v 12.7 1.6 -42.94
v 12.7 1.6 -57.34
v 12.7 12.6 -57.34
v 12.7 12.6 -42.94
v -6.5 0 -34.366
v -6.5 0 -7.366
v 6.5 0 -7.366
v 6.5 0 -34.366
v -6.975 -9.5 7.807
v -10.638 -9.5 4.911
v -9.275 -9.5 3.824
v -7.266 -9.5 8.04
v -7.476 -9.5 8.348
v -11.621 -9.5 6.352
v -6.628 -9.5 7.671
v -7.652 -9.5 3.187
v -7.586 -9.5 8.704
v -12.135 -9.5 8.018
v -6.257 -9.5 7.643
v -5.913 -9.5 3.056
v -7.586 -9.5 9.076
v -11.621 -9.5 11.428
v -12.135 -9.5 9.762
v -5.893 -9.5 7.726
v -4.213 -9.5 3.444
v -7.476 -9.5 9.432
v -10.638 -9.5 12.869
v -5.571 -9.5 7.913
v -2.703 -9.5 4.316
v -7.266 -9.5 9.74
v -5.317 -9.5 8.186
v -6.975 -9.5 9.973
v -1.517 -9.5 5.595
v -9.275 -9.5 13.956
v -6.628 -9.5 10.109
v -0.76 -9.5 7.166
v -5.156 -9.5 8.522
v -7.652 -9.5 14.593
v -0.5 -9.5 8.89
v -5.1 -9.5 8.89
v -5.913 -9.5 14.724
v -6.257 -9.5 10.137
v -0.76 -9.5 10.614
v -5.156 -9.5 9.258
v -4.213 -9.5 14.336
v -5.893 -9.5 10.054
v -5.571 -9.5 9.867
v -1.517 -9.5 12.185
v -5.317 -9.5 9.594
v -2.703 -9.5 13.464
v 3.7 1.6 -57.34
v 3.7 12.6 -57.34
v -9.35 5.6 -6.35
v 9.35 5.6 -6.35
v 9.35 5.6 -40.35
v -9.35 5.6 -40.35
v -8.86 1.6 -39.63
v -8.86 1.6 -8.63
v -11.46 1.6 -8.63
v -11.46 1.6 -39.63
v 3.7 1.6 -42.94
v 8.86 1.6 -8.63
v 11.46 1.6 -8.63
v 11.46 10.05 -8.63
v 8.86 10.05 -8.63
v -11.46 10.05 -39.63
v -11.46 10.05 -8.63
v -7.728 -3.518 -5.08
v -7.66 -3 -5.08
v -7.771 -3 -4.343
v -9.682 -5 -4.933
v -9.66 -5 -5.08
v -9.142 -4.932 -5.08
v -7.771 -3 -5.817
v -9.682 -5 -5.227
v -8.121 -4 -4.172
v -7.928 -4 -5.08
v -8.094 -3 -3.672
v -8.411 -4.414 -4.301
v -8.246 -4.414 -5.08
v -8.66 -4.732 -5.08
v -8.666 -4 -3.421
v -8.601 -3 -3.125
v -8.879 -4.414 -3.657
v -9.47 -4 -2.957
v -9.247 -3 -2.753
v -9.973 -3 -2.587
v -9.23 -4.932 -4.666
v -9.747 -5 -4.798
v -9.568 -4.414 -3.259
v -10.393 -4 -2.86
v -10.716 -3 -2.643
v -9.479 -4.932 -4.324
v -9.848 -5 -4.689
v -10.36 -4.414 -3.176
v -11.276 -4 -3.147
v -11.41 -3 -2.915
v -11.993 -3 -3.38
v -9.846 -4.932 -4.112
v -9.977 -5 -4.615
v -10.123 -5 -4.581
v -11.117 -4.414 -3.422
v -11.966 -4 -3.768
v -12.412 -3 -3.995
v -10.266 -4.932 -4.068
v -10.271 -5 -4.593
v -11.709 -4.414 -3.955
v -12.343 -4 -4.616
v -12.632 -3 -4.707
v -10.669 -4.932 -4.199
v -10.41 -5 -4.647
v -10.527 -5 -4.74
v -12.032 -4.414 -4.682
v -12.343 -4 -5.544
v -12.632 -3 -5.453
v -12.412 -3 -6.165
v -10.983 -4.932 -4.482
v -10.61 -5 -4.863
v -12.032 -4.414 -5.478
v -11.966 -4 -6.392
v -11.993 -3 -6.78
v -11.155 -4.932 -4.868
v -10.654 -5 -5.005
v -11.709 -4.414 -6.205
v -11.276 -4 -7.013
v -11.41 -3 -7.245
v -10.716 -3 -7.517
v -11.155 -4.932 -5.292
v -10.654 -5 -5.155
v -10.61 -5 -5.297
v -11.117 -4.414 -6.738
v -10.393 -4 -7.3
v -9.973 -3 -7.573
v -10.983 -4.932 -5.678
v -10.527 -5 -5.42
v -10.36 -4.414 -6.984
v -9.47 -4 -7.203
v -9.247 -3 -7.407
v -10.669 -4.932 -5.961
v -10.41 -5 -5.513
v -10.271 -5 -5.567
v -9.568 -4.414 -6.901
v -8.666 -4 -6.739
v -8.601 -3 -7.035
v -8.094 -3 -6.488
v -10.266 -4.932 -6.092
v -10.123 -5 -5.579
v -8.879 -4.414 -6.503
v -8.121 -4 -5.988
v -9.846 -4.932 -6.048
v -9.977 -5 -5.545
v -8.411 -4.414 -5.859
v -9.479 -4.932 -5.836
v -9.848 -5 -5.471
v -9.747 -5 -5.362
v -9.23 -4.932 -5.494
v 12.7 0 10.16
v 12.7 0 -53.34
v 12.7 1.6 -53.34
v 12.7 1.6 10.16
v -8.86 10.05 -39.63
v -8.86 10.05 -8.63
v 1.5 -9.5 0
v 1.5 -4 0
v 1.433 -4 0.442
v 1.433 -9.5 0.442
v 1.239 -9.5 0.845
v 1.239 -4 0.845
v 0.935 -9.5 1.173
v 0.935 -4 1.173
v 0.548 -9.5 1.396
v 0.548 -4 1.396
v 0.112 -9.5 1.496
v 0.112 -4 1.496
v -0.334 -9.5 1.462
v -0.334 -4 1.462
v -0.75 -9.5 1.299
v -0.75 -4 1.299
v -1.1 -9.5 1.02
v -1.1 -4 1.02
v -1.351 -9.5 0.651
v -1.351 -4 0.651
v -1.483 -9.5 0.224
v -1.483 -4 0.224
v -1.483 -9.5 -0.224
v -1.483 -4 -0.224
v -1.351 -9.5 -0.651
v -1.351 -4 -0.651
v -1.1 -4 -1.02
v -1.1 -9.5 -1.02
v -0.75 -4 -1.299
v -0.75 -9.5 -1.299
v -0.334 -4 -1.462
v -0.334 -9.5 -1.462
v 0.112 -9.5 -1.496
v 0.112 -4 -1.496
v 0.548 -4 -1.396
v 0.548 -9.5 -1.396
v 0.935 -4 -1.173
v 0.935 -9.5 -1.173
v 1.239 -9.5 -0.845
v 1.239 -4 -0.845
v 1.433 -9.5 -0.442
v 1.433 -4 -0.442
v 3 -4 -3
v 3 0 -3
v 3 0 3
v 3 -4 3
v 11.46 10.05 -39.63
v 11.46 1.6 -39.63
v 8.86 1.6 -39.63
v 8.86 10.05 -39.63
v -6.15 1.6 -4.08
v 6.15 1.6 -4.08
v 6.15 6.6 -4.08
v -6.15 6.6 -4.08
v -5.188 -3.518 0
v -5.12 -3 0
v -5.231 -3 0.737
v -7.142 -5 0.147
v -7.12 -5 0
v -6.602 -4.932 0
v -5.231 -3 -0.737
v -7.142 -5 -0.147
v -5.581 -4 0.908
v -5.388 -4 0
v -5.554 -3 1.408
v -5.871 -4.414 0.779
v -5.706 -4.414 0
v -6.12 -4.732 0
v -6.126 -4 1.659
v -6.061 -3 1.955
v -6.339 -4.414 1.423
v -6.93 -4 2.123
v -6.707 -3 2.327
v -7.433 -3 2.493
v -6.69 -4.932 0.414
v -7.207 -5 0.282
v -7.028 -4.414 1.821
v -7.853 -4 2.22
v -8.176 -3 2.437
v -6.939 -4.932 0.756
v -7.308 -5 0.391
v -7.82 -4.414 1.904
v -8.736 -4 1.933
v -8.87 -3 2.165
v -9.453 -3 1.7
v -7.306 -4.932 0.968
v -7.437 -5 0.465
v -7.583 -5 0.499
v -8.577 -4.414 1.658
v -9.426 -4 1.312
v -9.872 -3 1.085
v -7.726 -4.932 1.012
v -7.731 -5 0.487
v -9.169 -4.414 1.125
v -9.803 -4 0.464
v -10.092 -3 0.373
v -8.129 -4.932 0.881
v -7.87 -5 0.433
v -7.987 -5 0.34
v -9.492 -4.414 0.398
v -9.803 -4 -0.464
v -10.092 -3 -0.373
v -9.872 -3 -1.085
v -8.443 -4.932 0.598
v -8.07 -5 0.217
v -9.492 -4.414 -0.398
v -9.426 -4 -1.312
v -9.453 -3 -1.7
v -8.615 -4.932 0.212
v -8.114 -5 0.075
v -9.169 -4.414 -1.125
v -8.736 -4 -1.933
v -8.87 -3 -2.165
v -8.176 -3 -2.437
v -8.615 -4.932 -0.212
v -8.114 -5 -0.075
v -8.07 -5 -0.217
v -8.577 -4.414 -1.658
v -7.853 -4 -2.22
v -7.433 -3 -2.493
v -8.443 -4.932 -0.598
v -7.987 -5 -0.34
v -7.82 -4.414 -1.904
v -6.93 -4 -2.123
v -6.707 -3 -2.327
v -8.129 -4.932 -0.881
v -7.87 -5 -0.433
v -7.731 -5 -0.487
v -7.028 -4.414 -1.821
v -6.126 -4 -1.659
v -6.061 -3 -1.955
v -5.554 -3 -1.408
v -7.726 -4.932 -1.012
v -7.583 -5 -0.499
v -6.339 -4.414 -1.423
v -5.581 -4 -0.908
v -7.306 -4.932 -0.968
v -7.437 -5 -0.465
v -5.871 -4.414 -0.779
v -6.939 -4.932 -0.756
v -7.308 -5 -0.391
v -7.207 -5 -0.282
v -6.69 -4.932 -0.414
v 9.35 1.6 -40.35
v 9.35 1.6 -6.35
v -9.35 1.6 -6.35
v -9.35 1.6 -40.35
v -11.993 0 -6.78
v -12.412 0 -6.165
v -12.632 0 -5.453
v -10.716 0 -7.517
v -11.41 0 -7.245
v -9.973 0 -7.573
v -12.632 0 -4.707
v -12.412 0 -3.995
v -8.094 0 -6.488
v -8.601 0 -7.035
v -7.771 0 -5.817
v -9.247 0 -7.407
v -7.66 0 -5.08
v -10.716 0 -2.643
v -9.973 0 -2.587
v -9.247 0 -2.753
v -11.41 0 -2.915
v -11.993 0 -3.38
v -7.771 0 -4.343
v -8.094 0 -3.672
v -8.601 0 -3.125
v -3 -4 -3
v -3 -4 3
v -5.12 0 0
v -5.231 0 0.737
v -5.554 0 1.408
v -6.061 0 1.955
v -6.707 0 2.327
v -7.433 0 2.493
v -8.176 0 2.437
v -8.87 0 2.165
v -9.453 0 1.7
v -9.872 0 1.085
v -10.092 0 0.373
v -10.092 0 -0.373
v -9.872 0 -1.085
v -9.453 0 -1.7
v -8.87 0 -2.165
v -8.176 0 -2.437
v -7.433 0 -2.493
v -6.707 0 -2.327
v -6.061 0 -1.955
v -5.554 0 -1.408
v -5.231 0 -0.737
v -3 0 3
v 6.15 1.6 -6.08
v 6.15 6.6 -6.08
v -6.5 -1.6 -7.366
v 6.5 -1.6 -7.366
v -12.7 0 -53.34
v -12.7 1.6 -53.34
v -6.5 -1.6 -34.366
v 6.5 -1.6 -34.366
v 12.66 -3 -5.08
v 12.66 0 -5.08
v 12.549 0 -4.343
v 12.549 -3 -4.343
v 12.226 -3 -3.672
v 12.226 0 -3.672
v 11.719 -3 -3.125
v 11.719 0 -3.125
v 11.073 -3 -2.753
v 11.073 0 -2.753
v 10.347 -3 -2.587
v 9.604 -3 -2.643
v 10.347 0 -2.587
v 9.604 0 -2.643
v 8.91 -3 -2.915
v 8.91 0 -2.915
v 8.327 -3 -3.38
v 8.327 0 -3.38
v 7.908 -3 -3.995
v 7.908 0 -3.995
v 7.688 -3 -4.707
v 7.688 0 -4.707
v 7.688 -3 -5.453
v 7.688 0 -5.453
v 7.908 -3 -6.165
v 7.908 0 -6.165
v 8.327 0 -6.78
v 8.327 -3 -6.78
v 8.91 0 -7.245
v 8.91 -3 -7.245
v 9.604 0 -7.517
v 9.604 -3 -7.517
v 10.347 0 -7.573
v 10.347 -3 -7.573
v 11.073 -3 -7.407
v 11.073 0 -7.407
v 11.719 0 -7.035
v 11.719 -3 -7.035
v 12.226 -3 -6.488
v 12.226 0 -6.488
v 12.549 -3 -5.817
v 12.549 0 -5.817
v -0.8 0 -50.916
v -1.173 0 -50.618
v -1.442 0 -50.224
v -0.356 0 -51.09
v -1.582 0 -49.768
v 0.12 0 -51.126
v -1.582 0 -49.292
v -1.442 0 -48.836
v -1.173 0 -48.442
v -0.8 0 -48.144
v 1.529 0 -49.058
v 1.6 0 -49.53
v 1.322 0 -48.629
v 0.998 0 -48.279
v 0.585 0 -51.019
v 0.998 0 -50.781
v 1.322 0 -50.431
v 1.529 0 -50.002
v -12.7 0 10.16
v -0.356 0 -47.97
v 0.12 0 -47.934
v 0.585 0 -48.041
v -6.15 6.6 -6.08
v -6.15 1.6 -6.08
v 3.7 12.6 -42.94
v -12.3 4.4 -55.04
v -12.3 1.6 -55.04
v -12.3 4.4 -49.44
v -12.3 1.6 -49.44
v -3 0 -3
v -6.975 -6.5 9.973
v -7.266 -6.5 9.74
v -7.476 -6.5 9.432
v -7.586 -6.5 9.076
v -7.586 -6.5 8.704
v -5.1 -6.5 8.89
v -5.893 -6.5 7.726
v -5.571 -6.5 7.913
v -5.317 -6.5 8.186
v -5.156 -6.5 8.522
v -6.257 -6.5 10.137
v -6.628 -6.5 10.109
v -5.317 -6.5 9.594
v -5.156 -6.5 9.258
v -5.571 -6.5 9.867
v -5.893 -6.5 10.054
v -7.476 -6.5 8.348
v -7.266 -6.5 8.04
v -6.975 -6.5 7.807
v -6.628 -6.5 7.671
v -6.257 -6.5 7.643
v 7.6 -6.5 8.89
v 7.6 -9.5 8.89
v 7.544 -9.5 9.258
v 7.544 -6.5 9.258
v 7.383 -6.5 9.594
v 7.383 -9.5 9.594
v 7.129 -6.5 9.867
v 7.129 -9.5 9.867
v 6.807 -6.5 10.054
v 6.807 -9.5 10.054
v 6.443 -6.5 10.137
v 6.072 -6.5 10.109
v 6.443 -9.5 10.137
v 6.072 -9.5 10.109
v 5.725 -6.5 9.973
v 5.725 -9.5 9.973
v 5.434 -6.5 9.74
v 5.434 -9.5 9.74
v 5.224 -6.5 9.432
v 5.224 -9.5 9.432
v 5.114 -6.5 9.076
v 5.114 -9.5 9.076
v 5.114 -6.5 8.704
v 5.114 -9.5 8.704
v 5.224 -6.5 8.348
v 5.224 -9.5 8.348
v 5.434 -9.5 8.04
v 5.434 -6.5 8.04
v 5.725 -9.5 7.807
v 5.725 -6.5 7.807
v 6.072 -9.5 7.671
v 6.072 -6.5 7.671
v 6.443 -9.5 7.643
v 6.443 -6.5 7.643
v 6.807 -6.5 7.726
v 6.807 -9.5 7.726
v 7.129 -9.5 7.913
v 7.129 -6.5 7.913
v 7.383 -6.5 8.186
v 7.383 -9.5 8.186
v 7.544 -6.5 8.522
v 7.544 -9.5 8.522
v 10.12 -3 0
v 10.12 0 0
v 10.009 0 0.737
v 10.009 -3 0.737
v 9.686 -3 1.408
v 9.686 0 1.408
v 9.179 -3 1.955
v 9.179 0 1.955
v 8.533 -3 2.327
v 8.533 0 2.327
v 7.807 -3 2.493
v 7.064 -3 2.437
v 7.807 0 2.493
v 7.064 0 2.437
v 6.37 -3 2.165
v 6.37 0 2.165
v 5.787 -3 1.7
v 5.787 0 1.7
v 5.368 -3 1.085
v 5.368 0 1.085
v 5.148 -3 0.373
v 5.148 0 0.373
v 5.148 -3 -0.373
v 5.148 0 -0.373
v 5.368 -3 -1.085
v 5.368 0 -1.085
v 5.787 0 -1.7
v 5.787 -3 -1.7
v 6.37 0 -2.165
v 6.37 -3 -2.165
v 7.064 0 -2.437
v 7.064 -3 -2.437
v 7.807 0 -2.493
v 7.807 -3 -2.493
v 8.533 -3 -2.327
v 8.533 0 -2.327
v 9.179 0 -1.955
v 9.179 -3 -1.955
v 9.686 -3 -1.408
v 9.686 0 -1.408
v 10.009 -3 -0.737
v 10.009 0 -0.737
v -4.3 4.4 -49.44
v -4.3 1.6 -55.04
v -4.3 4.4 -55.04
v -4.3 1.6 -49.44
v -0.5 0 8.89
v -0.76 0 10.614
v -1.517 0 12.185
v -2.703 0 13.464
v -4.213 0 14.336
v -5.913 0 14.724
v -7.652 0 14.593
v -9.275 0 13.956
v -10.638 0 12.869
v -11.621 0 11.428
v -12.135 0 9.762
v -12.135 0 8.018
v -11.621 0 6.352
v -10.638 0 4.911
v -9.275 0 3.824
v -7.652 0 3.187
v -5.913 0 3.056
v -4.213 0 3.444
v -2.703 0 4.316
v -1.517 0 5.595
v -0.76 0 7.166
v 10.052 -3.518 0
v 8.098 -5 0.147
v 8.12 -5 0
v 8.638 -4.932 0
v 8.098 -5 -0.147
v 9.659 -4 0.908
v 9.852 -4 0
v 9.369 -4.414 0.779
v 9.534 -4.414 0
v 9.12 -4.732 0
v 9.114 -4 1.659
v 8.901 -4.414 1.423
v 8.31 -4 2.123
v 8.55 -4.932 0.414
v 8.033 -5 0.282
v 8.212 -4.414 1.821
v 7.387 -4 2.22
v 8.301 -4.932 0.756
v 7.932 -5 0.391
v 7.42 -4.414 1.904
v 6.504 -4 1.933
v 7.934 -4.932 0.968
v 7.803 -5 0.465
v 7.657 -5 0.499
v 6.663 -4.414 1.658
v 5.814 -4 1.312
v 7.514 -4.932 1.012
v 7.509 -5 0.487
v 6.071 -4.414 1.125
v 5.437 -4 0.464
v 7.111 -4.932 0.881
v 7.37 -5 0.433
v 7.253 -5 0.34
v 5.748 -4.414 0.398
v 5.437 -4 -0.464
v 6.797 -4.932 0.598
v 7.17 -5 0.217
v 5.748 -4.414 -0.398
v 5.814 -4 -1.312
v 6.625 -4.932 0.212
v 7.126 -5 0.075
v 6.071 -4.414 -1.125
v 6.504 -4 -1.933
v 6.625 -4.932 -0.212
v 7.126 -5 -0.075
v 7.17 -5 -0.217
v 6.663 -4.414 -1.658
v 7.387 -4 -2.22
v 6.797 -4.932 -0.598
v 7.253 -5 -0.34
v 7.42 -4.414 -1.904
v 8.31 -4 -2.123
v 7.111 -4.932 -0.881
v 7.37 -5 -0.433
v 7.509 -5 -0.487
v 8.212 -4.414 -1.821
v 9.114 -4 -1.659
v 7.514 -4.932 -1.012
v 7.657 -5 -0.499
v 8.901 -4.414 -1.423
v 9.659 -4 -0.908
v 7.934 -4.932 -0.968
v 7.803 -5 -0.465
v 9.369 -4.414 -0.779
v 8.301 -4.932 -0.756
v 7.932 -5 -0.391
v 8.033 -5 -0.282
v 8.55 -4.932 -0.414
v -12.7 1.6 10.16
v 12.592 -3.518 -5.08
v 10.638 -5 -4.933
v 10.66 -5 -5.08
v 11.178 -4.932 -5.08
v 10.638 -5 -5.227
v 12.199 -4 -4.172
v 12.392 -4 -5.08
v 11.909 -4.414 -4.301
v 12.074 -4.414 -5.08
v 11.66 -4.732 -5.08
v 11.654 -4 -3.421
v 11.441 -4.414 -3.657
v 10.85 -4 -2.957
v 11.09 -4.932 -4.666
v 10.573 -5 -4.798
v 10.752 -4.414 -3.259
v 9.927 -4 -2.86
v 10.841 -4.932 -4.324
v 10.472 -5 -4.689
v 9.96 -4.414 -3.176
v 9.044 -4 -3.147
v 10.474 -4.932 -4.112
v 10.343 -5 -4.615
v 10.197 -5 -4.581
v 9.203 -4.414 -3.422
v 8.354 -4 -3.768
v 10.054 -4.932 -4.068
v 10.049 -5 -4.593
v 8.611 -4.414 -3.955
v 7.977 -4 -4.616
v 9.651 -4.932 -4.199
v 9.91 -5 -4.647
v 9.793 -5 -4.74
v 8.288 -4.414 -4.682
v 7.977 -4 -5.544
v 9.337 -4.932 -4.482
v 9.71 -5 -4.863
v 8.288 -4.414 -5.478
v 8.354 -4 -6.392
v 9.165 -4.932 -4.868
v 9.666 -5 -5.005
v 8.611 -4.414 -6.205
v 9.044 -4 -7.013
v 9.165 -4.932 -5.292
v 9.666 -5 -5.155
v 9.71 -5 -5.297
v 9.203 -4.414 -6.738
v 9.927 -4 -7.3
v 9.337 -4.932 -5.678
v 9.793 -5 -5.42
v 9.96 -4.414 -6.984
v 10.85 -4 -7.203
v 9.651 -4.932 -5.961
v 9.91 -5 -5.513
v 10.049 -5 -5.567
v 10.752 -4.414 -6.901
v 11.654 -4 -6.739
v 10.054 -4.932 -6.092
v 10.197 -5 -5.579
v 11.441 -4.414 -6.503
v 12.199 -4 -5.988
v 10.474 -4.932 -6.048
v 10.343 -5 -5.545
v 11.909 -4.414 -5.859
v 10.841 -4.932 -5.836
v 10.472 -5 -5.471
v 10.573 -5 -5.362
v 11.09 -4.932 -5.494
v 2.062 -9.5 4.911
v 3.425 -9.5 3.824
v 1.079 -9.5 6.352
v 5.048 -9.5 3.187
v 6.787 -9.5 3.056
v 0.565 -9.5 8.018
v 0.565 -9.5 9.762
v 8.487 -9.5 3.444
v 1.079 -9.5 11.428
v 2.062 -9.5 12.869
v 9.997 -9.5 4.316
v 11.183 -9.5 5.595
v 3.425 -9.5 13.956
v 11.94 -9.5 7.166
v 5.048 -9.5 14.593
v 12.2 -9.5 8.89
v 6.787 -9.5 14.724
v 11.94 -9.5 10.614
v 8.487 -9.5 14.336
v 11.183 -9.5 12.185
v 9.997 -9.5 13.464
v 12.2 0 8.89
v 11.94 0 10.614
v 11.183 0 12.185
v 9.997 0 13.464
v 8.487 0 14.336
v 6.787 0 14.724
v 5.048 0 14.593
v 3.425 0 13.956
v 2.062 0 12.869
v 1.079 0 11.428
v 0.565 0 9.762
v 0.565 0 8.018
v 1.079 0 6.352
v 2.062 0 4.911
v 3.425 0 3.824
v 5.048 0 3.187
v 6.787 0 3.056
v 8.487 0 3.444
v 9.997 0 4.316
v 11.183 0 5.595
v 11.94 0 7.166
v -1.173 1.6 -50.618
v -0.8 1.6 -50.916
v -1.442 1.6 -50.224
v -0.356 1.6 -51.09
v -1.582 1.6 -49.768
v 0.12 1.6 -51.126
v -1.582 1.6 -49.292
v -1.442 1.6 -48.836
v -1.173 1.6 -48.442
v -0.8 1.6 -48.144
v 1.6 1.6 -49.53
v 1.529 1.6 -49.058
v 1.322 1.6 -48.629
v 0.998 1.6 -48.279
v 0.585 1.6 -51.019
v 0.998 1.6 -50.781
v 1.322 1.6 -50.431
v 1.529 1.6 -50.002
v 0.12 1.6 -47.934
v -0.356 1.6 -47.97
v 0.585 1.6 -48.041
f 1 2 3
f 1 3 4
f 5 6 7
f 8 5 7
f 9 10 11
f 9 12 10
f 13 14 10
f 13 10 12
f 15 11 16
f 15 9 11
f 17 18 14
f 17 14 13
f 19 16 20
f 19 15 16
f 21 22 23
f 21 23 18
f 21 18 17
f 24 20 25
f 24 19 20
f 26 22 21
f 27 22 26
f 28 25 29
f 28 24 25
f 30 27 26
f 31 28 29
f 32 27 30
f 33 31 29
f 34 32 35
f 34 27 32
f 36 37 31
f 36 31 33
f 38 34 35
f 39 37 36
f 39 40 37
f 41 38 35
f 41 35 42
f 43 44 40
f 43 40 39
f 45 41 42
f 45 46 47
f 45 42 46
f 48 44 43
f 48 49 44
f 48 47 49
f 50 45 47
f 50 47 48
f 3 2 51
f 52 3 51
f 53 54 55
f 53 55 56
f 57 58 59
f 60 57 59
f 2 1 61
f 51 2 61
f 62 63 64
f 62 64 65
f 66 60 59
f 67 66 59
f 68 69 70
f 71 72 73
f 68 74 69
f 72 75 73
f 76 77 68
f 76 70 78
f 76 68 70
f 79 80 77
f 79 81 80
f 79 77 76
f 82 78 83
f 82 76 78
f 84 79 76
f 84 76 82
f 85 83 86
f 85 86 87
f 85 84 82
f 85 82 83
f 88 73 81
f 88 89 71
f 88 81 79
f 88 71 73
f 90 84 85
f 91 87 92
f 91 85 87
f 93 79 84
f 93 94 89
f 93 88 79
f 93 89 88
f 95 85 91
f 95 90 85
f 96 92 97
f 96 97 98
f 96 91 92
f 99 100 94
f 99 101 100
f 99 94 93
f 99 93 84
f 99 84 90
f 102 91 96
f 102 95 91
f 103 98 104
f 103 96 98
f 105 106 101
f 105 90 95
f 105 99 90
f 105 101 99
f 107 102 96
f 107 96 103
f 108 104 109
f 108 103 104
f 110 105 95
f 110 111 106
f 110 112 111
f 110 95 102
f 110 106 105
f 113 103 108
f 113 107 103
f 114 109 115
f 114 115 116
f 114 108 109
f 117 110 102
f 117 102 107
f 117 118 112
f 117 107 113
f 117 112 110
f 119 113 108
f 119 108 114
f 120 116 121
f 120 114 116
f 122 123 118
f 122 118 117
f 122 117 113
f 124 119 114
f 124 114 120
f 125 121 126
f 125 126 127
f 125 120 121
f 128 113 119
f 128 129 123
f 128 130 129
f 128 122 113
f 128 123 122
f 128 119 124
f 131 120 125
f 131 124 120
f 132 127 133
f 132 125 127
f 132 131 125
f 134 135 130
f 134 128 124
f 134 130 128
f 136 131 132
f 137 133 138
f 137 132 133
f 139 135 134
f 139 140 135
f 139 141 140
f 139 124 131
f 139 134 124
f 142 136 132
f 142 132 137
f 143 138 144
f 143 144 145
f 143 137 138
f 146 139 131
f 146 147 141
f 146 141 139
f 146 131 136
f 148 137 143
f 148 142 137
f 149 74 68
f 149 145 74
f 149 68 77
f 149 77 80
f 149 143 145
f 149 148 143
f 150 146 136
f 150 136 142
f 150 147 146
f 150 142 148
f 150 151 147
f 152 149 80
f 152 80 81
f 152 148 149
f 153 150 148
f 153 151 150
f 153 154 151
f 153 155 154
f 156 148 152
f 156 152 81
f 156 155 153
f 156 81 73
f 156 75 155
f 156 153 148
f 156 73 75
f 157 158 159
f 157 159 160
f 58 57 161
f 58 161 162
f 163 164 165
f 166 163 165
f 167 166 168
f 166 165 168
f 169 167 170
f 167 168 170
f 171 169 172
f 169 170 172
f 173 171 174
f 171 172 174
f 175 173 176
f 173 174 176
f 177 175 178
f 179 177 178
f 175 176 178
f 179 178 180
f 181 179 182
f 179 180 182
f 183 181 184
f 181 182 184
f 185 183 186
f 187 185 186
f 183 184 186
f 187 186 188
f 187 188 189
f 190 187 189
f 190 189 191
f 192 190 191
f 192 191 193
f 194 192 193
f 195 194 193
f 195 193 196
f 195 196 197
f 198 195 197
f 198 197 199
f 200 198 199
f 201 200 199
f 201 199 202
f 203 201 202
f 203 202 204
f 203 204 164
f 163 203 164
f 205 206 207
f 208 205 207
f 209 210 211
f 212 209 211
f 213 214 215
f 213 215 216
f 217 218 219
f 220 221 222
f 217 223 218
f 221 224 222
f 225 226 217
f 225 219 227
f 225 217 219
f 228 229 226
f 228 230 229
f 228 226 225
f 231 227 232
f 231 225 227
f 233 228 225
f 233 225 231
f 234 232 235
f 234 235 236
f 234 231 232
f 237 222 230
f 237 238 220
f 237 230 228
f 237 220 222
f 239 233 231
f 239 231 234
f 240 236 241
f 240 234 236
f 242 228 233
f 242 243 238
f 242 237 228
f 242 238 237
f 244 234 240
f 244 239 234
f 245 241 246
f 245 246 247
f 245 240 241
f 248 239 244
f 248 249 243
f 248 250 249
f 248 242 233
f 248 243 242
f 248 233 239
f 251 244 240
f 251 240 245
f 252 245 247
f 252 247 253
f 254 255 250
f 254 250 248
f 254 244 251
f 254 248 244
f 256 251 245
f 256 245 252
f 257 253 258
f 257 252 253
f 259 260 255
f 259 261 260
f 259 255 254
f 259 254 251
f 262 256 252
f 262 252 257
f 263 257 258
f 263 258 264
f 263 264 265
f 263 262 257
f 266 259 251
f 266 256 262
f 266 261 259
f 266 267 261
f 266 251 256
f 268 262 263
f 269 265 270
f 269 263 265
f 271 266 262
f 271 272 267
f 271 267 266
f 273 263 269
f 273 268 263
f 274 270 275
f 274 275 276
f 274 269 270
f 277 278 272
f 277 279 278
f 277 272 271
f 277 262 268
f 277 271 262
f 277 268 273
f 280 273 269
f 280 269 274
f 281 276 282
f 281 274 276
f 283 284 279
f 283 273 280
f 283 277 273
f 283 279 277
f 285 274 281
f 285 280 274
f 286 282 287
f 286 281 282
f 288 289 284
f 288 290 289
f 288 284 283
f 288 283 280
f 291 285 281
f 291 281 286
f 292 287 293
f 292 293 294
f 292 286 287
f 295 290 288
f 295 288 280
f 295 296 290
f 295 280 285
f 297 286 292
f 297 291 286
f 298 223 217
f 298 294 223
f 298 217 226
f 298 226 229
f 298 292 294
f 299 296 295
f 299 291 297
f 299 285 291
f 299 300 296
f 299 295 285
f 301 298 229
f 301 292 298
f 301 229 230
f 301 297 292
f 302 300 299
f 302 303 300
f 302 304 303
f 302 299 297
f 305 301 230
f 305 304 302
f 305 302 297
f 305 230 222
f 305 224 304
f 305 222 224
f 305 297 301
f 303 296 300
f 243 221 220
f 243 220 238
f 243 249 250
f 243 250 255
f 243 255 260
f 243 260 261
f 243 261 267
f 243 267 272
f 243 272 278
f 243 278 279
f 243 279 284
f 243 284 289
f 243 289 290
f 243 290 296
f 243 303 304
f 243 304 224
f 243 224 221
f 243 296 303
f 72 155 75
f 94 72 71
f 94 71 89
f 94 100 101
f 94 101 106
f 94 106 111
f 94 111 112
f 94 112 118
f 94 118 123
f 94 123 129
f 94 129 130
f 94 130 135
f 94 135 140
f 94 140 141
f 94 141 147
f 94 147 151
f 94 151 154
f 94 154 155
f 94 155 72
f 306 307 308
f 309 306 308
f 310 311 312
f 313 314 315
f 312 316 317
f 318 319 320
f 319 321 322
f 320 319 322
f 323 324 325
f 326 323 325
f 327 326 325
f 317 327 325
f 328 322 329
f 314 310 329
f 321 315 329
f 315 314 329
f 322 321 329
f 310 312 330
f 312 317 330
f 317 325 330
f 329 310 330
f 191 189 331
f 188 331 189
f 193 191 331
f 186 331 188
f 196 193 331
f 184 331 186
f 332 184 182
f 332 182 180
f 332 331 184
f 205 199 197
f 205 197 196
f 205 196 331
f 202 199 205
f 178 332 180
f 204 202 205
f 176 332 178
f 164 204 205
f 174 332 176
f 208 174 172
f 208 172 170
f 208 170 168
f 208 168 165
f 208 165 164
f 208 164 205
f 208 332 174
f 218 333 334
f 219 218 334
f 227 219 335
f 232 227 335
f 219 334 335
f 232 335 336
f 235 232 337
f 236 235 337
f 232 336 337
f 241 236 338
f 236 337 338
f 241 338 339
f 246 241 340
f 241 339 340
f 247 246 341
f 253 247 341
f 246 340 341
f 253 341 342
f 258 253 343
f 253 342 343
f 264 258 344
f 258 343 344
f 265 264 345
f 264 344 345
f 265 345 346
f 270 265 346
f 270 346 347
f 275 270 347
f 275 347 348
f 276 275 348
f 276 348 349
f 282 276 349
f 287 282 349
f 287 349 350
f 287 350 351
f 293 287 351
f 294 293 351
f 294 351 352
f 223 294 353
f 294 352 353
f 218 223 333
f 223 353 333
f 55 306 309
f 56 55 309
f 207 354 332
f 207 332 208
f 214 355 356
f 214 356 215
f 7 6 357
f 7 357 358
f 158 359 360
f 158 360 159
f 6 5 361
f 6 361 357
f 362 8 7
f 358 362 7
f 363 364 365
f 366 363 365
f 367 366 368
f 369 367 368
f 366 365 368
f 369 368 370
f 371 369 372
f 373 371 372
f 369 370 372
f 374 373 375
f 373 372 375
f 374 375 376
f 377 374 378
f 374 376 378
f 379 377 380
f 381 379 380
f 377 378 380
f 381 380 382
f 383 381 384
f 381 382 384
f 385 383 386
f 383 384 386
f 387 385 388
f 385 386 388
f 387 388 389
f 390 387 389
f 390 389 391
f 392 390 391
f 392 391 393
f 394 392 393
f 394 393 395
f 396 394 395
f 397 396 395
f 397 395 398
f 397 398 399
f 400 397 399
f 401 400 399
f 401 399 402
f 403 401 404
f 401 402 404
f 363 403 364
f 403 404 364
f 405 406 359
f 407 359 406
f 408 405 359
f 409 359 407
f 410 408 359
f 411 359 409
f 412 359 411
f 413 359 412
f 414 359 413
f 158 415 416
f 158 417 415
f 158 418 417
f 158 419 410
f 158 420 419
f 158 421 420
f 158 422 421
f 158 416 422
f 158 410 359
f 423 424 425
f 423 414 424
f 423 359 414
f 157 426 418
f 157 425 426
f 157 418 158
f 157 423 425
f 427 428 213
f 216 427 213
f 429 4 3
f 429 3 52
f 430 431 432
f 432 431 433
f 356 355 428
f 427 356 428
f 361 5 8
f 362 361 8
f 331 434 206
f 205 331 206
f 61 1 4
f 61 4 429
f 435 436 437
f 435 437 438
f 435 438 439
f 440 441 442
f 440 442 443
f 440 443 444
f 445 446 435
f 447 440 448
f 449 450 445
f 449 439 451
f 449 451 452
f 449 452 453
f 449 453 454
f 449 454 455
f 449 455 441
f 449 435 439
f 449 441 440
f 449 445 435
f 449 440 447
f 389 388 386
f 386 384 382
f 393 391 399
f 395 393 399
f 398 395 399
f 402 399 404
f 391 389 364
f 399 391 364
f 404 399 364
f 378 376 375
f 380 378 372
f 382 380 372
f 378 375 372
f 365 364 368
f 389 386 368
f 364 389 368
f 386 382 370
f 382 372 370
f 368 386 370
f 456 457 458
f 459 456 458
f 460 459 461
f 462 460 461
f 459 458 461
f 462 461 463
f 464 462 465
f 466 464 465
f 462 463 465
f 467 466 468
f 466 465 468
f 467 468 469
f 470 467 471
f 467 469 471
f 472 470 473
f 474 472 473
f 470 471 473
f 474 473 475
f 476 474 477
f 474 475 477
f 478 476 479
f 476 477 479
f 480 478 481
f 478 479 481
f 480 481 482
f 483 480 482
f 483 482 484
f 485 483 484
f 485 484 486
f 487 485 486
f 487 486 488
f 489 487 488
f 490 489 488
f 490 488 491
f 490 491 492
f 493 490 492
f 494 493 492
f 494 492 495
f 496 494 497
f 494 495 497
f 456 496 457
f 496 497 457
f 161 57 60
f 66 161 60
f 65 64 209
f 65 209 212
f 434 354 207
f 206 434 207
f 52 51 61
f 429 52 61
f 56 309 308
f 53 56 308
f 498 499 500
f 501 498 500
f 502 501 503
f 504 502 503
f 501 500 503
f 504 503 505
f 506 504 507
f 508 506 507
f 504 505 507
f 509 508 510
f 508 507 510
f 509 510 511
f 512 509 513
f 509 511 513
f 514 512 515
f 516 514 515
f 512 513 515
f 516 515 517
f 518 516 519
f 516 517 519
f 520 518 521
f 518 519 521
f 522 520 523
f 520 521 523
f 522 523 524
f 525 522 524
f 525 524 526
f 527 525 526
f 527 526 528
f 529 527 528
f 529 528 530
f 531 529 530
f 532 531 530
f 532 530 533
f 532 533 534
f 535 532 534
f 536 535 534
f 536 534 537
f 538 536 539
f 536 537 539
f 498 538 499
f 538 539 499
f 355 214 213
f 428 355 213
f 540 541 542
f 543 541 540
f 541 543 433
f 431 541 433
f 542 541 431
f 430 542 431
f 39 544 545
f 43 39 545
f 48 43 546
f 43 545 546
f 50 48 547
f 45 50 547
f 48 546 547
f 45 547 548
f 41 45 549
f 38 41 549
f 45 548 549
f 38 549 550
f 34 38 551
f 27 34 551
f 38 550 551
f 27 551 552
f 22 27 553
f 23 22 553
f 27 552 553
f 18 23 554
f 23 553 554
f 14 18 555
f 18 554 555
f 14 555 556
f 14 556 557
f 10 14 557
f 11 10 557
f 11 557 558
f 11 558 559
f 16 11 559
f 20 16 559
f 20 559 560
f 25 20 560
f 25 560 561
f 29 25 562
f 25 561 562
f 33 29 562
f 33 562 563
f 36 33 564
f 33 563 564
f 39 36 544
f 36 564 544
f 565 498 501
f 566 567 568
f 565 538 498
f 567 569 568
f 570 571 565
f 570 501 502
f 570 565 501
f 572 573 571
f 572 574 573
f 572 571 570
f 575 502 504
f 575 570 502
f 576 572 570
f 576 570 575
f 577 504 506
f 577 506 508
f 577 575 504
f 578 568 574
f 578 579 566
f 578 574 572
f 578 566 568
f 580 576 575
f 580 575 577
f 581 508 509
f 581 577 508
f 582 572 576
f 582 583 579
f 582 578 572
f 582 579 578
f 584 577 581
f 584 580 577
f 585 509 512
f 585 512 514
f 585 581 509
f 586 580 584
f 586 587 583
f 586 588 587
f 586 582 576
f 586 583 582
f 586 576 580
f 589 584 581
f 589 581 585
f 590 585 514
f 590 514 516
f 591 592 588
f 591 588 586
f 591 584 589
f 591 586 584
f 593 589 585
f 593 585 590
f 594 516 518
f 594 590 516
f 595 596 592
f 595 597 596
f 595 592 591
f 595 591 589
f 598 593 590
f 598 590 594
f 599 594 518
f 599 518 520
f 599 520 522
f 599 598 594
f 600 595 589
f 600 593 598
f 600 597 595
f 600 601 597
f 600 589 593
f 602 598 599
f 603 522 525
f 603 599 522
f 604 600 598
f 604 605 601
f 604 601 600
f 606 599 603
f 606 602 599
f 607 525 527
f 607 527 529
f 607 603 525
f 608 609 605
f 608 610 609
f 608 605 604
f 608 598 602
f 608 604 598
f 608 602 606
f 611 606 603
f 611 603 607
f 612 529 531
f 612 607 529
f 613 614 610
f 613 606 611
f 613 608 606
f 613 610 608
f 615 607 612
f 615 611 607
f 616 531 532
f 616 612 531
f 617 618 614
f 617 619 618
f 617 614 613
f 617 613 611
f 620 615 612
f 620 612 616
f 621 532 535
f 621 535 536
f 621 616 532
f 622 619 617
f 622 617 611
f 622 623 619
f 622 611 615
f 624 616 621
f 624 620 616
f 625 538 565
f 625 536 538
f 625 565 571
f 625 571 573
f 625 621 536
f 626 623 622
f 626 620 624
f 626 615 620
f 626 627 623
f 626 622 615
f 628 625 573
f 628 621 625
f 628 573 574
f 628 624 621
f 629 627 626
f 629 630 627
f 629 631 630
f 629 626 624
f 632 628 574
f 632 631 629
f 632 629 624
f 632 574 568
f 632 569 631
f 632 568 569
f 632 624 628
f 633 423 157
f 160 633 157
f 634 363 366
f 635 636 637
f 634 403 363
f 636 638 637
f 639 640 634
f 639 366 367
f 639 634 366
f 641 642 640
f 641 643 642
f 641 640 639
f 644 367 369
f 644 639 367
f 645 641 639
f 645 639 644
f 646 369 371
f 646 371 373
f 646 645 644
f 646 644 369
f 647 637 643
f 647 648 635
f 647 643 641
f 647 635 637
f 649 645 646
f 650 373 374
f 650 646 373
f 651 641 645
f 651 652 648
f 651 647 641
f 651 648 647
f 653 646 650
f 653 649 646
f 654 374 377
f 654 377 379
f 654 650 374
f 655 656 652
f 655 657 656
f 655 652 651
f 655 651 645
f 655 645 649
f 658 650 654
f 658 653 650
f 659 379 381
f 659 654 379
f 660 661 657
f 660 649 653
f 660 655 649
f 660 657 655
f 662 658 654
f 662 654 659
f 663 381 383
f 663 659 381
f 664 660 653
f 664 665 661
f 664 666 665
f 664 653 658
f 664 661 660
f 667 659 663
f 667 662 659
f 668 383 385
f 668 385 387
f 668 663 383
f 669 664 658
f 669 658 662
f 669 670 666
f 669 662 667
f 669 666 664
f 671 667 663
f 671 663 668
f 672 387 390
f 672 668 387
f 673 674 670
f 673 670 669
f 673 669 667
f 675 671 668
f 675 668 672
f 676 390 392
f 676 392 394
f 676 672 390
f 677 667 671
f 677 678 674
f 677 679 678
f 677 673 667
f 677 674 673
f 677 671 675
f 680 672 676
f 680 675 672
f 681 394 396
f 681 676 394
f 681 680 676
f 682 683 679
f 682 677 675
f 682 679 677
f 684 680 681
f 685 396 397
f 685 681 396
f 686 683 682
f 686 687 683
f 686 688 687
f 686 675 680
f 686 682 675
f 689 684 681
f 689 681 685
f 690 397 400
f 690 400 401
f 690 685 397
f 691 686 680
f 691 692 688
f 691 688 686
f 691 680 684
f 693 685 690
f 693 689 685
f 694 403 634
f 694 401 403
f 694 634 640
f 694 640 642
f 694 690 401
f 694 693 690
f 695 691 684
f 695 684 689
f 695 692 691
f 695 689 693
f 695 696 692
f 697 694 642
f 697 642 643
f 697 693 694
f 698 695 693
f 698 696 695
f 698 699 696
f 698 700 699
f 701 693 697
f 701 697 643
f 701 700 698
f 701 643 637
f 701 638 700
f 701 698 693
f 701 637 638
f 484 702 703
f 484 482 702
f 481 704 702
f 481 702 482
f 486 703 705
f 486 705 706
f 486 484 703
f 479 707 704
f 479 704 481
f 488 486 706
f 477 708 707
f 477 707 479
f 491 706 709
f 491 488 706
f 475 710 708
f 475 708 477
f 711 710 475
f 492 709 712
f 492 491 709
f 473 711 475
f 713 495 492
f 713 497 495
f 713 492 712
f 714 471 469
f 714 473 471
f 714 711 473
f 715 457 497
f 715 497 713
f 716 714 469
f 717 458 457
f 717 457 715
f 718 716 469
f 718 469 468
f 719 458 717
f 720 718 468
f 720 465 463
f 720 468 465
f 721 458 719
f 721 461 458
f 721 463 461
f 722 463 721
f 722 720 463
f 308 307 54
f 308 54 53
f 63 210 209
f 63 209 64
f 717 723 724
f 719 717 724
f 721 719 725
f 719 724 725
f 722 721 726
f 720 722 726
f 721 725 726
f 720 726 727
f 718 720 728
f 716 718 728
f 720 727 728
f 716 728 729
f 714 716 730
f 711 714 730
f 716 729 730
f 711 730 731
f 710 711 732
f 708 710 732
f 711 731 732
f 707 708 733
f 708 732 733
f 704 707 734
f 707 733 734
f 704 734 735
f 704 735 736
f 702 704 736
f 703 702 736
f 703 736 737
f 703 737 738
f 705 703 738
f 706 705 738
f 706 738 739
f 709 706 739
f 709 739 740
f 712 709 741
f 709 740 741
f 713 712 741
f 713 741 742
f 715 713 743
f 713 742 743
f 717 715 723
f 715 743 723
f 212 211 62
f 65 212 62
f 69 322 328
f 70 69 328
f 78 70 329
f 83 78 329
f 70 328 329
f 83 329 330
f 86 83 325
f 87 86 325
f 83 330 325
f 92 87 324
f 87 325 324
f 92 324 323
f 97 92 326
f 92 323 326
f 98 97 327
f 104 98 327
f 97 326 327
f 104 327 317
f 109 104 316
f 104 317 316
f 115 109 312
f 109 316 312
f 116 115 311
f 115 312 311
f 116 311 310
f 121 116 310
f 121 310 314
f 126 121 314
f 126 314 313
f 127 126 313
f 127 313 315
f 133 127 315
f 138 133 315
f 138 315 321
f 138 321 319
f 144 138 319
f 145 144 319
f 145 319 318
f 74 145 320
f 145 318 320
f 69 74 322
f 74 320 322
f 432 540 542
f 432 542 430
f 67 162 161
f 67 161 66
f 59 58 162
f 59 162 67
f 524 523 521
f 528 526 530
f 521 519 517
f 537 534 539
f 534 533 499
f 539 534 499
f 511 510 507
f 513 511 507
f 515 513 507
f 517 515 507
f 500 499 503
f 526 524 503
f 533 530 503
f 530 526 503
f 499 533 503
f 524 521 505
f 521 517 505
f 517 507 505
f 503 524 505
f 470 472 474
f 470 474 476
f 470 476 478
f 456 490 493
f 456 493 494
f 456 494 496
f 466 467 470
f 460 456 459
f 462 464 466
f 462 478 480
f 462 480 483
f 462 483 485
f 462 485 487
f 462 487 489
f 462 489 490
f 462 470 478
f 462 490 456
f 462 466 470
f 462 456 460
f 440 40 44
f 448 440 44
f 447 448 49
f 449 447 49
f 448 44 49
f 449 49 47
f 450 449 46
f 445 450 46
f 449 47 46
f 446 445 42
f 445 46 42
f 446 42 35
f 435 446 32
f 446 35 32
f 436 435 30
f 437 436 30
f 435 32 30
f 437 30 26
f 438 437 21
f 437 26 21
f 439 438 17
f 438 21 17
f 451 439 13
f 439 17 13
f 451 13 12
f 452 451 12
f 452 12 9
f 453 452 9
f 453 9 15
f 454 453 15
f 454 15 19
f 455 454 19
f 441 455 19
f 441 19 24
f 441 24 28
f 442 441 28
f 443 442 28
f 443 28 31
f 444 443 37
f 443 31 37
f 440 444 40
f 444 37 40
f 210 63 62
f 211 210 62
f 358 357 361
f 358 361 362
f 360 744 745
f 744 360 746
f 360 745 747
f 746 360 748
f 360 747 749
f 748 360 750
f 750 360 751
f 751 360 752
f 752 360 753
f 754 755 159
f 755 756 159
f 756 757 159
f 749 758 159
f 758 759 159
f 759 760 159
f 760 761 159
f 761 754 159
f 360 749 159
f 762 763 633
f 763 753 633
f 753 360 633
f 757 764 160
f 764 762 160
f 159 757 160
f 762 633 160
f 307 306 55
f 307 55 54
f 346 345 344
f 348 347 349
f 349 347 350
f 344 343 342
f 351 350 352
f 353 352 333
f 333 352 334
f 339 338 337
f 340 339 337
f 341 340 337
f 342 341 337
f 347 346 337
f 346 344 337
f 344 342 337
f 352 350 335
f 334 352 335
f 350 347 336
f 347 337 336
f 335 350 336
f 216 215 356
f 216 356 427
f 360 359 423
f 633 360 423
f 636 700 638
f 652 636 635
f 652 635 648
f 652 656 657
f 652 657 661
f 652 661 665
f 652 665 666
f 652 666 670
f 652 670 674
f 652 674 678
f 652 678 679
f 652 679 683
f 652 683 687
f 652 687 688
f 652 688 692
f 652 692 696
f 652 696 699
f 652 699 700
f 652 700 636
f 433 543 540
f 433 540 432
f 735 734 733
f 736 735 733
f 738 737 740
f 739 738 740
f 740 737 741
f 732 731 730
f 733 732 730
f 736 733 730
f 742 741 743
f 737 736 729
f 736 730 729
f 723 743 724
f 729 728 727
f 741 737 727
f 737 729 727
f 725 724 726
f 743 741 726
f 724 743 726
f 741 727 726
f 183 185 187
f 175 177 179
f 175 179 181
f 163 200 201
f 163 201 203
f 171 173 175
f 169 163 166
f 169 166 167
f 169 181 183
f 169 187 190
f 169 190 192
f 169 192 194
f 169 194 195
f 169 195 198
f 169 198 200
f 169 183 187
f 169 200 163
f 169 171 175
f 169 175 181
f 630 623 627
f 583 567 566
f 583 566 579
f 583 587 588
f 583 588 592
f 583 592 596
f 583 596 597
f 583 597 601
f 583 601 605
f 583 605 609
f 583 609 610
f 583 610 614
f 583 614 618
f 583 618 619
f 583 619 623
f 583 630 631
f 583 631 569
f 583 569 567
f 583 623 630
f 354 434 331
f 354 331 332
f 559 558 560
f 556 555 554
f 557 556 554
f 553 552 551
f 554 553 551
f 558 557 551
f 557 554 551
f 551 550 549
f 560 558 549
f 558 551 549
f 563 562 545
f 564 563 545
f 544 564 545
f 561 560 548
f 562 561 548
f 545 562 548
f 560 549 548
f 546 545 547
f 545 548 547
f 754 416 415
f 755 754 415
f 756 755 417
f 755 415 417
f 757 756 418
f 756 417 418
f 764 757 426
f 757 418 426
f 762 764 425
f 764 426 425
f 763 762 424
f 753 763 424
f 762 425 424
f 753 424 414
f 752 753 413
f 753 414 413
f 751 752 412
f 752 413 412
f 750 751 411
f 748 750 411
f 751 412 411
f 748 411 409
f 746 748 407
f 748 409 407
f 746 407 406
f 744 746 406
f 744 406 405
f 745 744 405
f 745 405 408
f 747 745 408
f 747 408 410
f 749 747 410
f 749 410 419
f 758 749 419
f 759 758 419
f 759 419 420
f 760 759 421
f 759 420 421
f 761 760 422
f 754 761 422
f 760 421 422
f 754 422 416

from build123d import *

# Parameters (mm, degrees)
F0_W      = 25.4
F0_H      = 63.5
F0_R      = 1.6
F1_DEPTH  = 1.6
F2_W      = 6
F2_H      = 6
F3_DEPTH  = 4
F4_R      = 1.5
F5_DEPTH  = 9.5
F6_R      = 5.85
F7_DEPTH  = 9.5
F8_W      = 13
F8_H      = 27
F9_DEPTH  = 1.6
F10_W     = 18.7
F10_H     = 34
F11_DEPTH = 4
F12_W     = 2.6
F12_H     = 31
F13_DEPTH = 8.45
F14_W     = 9
F14_H     = 14.4
F15_DEPTH = 11
F16_W     = 8
F16_H     = 5.6
F17_DEPTH = 2.8
F18_W     = 12.3
F18_H     = 2
F19_DEPTH = 5
F20_R     = 2.5
F21_DEPTH = 5
F22_R     = 2
F22_2_R   = 2
F22_3_R   = 2
F22_4_R   = 2
F23_R     = 1.25
F24_DEPTH = 3


with BuildPart() as f1:
    # F0 (on Front) → F1 (new body)
    with BuildSketch(Plane.XZ):
        with Locations((0, -21.59)):
            Rectangle(F0_W, F0_H)
        with Locations((0, -49.53)):
            Circle(F0_R, mode=Mode.SUBTRACT)
    extrude(amount=-F1_DEPTH)


with BuildPart() as f3:
    # F2 (on Front) → F3 (new body)
    with BuildSketch(Plane.XZ):
        Rectangle(F2_W, F2_H)
    extrude(amount=F3_DEPTH)

    # F4 (on Front) → F5 (join)
    with BuildSketch(Plane.XZ):
        Circle(F4_R)
    extrude(amount=F5_DEPTH)


with BuildPart() as f7:
    # F6 (on Front) → F7 (new body)
    with BuildSketch(Plane.XZ):
        with Locations((-6.35, 8.89)):
            Circle(F6_R)
    extrude(amount=F7_DEPTH)


with BuildPart() as f7b:
    # F6 (on Front) → F7, piece 2 (new body)
    with BuildSketch(Plane.XZ):
        with Locations((6.35, 8.89)):
            Circle(F6_R)
    extrude(amount=F7_DEPTH)


with BuildPart() as f9:
    # F8 (on Front) → F9 (new body)
    with BuildSketch(Plane.XZ):
        with Locations((0, -20.866)):
            Rectangle(F8_W, F8_H)
    extrude(amount=F9_DEPTH)


with BuildPart() as f11:
    # F10 (on face) → F11 (new body)
    with BuildSketch(Plane(origin=(0, 1.6, 0), x_dir=(-1, 0, 0), z_dir=(0, 1, 0))):
        with Locations((0, -23.35)):
            Rectangle(F10_W, F10_H)
    extrude(amount=F11_DEPTH)


with BuildPart() as f13:
    # F12 (on face) → F13 (new body)
    with BuildSketch(Plane(origin=(0, 1.6, 0), x_dir=(-1, 0, 0), z_dir=(0, 1, 0))):
        with Locations((-10.16, -24.13)):
            Rectangle(F12_W, F12_H)
    extrude(amount=F13_DEPTH)


with BuildPart() as f13b:
    # F12 (on face) → F13, piece 2 (new body)
    with BuildSketch(Plane(origin=(0, 1.6, 0), x_dir=(-1, 0, 0), z_dir=(0, 1, 0))):
        with Locations((10.16, -24.13)):
            Rectangle(F12_W, F12_H)
    extrude(amount=F13_DEPTH)


with BuildPart() as f15:
    # F14 (on face) → F15 (new body)
    with BuildSketch(Plane(origin=(0, 1.6, 0), x_dir=(-1, 0, 0), z_dir=(0, 1, 0))):
        with Locations((-8.2, -50.14)):
            Rectangle(F14_W, F14_H)
    extrude(amount=F15_DEPTH)


with BuildPart() as f17:
    # F16 (on face) → F17 (new body)
    with BuildSketch(Plane(origin=(0, 1.6, 0), x_dir=(-1, 0, 0), z_dir=(0, 1, 0))):
        with Locations((8.3, -52.24)):
            Rectangle(F16_W, F16_H)
    extrude(amount=F17_DEPTH)


with BuildPart() as f19:
    # F18 (on face) → F19 (new body)
    with BuildSketch(Plane(origin=(0, 1.6, 0), x_dir=(-1, 0, 0), z_dir=(0, 1, 0))):
        with Locations((0, -5.08)):
            Rectangle(F18_W, F18_H)
    extrude(amount=F19_DEPTH)


with BuildPart() as f21:
    # F20 (on Front) → F21 (new body)
    with BuildSketch(Plane.XZ):
        with Locations((-7.62, 0)):
            Circle(F20_R)
    extrude(amount=F21_DEPTH)

    # F22#2
    f22_2_edges = [f21.edges().sort_by_distance(p)[0] for p in [
        (-10.12, -5, 0),
    ]]
    fillet(f22_2_edges, radius=F22_2_R)


with BuildPart() as f21b:
    # F20 (on Front) → F21, piece 2 (new body)
    with BuildSketch(Plane.XZ):
        with Locations((7.62, 0)):
            Circle(F20_R)
    extrude(amount=F21_DEPTH)

    # F22#3
    f22_3_edges = [f21b.edges().sort_by_distance(p)[0] for p in [
        (5.12, -5, 0),
    ]]
    fillet(f22_3_edges, radius=F22_3_R)


with BuildPart() as f21c:
    # F20 (on Front) → F21, piece 3 (new body)
    with BuildSketch(Plane.XZ):
        with Locations((10.16, -5.08)):
            Circle(F20_R)
    extrude(amount=F21_DEPTH)

    # F22#4
    f22_4_edges = [f21c.edges().sort_by_distance(p)[0] for p in [
        (7.66, -5, -5.08),
    ]]
    fillet(f22_4_edges, radius=F22_4_R)


with BuildPart() as f21d:
    # F20 (on Front) → F21, piece 4 (new body)
    with BuildSketch(Plane.XZ):
        with Locations((-10.16, -5.08)):
            Circle(F20_R)
    extrude(amount=F21_DEPTH)

    # F22
    f22_edges = [f21d.edges().sort_by_distance(p)[0] for p in [
        (-12.66, -5, -5.08),
    ]]
    fillet(f22_edges, radius=F22_R)


with BuildPart() as f24_tool:
    # F23 (on face) → F24 (new body)
    with BuildSketch(Plane.XZ.offset(9.5)):
        with Locations((-6.35, 8.89)):
            Circle(F23_R)
        with Locations((6.35, 8.89)):
            Circle(F23_R)
    extrude(amount=-F24_DEPTH)


with BuildPart() as f7_1:
    add(f7.part)

    # F24: cut by f24_tool
    add(f24_tool.part, mode=Mode.SUBTRACT)


with BuildPart() as f7b_1:
    add(f7b.part)

    # F24: cut by f24_tool
    add(f24_tool.part, mode=Mode.SUBTRACT)


solid = Compound([f1.part, f3.part, f9.part, f11.part, f13.part, f13b.part, f15.part, f17.part, f19.part, f21.part, f21b.part, f21c.part, f21d.part, f7_1.part, f7b_1.part])
